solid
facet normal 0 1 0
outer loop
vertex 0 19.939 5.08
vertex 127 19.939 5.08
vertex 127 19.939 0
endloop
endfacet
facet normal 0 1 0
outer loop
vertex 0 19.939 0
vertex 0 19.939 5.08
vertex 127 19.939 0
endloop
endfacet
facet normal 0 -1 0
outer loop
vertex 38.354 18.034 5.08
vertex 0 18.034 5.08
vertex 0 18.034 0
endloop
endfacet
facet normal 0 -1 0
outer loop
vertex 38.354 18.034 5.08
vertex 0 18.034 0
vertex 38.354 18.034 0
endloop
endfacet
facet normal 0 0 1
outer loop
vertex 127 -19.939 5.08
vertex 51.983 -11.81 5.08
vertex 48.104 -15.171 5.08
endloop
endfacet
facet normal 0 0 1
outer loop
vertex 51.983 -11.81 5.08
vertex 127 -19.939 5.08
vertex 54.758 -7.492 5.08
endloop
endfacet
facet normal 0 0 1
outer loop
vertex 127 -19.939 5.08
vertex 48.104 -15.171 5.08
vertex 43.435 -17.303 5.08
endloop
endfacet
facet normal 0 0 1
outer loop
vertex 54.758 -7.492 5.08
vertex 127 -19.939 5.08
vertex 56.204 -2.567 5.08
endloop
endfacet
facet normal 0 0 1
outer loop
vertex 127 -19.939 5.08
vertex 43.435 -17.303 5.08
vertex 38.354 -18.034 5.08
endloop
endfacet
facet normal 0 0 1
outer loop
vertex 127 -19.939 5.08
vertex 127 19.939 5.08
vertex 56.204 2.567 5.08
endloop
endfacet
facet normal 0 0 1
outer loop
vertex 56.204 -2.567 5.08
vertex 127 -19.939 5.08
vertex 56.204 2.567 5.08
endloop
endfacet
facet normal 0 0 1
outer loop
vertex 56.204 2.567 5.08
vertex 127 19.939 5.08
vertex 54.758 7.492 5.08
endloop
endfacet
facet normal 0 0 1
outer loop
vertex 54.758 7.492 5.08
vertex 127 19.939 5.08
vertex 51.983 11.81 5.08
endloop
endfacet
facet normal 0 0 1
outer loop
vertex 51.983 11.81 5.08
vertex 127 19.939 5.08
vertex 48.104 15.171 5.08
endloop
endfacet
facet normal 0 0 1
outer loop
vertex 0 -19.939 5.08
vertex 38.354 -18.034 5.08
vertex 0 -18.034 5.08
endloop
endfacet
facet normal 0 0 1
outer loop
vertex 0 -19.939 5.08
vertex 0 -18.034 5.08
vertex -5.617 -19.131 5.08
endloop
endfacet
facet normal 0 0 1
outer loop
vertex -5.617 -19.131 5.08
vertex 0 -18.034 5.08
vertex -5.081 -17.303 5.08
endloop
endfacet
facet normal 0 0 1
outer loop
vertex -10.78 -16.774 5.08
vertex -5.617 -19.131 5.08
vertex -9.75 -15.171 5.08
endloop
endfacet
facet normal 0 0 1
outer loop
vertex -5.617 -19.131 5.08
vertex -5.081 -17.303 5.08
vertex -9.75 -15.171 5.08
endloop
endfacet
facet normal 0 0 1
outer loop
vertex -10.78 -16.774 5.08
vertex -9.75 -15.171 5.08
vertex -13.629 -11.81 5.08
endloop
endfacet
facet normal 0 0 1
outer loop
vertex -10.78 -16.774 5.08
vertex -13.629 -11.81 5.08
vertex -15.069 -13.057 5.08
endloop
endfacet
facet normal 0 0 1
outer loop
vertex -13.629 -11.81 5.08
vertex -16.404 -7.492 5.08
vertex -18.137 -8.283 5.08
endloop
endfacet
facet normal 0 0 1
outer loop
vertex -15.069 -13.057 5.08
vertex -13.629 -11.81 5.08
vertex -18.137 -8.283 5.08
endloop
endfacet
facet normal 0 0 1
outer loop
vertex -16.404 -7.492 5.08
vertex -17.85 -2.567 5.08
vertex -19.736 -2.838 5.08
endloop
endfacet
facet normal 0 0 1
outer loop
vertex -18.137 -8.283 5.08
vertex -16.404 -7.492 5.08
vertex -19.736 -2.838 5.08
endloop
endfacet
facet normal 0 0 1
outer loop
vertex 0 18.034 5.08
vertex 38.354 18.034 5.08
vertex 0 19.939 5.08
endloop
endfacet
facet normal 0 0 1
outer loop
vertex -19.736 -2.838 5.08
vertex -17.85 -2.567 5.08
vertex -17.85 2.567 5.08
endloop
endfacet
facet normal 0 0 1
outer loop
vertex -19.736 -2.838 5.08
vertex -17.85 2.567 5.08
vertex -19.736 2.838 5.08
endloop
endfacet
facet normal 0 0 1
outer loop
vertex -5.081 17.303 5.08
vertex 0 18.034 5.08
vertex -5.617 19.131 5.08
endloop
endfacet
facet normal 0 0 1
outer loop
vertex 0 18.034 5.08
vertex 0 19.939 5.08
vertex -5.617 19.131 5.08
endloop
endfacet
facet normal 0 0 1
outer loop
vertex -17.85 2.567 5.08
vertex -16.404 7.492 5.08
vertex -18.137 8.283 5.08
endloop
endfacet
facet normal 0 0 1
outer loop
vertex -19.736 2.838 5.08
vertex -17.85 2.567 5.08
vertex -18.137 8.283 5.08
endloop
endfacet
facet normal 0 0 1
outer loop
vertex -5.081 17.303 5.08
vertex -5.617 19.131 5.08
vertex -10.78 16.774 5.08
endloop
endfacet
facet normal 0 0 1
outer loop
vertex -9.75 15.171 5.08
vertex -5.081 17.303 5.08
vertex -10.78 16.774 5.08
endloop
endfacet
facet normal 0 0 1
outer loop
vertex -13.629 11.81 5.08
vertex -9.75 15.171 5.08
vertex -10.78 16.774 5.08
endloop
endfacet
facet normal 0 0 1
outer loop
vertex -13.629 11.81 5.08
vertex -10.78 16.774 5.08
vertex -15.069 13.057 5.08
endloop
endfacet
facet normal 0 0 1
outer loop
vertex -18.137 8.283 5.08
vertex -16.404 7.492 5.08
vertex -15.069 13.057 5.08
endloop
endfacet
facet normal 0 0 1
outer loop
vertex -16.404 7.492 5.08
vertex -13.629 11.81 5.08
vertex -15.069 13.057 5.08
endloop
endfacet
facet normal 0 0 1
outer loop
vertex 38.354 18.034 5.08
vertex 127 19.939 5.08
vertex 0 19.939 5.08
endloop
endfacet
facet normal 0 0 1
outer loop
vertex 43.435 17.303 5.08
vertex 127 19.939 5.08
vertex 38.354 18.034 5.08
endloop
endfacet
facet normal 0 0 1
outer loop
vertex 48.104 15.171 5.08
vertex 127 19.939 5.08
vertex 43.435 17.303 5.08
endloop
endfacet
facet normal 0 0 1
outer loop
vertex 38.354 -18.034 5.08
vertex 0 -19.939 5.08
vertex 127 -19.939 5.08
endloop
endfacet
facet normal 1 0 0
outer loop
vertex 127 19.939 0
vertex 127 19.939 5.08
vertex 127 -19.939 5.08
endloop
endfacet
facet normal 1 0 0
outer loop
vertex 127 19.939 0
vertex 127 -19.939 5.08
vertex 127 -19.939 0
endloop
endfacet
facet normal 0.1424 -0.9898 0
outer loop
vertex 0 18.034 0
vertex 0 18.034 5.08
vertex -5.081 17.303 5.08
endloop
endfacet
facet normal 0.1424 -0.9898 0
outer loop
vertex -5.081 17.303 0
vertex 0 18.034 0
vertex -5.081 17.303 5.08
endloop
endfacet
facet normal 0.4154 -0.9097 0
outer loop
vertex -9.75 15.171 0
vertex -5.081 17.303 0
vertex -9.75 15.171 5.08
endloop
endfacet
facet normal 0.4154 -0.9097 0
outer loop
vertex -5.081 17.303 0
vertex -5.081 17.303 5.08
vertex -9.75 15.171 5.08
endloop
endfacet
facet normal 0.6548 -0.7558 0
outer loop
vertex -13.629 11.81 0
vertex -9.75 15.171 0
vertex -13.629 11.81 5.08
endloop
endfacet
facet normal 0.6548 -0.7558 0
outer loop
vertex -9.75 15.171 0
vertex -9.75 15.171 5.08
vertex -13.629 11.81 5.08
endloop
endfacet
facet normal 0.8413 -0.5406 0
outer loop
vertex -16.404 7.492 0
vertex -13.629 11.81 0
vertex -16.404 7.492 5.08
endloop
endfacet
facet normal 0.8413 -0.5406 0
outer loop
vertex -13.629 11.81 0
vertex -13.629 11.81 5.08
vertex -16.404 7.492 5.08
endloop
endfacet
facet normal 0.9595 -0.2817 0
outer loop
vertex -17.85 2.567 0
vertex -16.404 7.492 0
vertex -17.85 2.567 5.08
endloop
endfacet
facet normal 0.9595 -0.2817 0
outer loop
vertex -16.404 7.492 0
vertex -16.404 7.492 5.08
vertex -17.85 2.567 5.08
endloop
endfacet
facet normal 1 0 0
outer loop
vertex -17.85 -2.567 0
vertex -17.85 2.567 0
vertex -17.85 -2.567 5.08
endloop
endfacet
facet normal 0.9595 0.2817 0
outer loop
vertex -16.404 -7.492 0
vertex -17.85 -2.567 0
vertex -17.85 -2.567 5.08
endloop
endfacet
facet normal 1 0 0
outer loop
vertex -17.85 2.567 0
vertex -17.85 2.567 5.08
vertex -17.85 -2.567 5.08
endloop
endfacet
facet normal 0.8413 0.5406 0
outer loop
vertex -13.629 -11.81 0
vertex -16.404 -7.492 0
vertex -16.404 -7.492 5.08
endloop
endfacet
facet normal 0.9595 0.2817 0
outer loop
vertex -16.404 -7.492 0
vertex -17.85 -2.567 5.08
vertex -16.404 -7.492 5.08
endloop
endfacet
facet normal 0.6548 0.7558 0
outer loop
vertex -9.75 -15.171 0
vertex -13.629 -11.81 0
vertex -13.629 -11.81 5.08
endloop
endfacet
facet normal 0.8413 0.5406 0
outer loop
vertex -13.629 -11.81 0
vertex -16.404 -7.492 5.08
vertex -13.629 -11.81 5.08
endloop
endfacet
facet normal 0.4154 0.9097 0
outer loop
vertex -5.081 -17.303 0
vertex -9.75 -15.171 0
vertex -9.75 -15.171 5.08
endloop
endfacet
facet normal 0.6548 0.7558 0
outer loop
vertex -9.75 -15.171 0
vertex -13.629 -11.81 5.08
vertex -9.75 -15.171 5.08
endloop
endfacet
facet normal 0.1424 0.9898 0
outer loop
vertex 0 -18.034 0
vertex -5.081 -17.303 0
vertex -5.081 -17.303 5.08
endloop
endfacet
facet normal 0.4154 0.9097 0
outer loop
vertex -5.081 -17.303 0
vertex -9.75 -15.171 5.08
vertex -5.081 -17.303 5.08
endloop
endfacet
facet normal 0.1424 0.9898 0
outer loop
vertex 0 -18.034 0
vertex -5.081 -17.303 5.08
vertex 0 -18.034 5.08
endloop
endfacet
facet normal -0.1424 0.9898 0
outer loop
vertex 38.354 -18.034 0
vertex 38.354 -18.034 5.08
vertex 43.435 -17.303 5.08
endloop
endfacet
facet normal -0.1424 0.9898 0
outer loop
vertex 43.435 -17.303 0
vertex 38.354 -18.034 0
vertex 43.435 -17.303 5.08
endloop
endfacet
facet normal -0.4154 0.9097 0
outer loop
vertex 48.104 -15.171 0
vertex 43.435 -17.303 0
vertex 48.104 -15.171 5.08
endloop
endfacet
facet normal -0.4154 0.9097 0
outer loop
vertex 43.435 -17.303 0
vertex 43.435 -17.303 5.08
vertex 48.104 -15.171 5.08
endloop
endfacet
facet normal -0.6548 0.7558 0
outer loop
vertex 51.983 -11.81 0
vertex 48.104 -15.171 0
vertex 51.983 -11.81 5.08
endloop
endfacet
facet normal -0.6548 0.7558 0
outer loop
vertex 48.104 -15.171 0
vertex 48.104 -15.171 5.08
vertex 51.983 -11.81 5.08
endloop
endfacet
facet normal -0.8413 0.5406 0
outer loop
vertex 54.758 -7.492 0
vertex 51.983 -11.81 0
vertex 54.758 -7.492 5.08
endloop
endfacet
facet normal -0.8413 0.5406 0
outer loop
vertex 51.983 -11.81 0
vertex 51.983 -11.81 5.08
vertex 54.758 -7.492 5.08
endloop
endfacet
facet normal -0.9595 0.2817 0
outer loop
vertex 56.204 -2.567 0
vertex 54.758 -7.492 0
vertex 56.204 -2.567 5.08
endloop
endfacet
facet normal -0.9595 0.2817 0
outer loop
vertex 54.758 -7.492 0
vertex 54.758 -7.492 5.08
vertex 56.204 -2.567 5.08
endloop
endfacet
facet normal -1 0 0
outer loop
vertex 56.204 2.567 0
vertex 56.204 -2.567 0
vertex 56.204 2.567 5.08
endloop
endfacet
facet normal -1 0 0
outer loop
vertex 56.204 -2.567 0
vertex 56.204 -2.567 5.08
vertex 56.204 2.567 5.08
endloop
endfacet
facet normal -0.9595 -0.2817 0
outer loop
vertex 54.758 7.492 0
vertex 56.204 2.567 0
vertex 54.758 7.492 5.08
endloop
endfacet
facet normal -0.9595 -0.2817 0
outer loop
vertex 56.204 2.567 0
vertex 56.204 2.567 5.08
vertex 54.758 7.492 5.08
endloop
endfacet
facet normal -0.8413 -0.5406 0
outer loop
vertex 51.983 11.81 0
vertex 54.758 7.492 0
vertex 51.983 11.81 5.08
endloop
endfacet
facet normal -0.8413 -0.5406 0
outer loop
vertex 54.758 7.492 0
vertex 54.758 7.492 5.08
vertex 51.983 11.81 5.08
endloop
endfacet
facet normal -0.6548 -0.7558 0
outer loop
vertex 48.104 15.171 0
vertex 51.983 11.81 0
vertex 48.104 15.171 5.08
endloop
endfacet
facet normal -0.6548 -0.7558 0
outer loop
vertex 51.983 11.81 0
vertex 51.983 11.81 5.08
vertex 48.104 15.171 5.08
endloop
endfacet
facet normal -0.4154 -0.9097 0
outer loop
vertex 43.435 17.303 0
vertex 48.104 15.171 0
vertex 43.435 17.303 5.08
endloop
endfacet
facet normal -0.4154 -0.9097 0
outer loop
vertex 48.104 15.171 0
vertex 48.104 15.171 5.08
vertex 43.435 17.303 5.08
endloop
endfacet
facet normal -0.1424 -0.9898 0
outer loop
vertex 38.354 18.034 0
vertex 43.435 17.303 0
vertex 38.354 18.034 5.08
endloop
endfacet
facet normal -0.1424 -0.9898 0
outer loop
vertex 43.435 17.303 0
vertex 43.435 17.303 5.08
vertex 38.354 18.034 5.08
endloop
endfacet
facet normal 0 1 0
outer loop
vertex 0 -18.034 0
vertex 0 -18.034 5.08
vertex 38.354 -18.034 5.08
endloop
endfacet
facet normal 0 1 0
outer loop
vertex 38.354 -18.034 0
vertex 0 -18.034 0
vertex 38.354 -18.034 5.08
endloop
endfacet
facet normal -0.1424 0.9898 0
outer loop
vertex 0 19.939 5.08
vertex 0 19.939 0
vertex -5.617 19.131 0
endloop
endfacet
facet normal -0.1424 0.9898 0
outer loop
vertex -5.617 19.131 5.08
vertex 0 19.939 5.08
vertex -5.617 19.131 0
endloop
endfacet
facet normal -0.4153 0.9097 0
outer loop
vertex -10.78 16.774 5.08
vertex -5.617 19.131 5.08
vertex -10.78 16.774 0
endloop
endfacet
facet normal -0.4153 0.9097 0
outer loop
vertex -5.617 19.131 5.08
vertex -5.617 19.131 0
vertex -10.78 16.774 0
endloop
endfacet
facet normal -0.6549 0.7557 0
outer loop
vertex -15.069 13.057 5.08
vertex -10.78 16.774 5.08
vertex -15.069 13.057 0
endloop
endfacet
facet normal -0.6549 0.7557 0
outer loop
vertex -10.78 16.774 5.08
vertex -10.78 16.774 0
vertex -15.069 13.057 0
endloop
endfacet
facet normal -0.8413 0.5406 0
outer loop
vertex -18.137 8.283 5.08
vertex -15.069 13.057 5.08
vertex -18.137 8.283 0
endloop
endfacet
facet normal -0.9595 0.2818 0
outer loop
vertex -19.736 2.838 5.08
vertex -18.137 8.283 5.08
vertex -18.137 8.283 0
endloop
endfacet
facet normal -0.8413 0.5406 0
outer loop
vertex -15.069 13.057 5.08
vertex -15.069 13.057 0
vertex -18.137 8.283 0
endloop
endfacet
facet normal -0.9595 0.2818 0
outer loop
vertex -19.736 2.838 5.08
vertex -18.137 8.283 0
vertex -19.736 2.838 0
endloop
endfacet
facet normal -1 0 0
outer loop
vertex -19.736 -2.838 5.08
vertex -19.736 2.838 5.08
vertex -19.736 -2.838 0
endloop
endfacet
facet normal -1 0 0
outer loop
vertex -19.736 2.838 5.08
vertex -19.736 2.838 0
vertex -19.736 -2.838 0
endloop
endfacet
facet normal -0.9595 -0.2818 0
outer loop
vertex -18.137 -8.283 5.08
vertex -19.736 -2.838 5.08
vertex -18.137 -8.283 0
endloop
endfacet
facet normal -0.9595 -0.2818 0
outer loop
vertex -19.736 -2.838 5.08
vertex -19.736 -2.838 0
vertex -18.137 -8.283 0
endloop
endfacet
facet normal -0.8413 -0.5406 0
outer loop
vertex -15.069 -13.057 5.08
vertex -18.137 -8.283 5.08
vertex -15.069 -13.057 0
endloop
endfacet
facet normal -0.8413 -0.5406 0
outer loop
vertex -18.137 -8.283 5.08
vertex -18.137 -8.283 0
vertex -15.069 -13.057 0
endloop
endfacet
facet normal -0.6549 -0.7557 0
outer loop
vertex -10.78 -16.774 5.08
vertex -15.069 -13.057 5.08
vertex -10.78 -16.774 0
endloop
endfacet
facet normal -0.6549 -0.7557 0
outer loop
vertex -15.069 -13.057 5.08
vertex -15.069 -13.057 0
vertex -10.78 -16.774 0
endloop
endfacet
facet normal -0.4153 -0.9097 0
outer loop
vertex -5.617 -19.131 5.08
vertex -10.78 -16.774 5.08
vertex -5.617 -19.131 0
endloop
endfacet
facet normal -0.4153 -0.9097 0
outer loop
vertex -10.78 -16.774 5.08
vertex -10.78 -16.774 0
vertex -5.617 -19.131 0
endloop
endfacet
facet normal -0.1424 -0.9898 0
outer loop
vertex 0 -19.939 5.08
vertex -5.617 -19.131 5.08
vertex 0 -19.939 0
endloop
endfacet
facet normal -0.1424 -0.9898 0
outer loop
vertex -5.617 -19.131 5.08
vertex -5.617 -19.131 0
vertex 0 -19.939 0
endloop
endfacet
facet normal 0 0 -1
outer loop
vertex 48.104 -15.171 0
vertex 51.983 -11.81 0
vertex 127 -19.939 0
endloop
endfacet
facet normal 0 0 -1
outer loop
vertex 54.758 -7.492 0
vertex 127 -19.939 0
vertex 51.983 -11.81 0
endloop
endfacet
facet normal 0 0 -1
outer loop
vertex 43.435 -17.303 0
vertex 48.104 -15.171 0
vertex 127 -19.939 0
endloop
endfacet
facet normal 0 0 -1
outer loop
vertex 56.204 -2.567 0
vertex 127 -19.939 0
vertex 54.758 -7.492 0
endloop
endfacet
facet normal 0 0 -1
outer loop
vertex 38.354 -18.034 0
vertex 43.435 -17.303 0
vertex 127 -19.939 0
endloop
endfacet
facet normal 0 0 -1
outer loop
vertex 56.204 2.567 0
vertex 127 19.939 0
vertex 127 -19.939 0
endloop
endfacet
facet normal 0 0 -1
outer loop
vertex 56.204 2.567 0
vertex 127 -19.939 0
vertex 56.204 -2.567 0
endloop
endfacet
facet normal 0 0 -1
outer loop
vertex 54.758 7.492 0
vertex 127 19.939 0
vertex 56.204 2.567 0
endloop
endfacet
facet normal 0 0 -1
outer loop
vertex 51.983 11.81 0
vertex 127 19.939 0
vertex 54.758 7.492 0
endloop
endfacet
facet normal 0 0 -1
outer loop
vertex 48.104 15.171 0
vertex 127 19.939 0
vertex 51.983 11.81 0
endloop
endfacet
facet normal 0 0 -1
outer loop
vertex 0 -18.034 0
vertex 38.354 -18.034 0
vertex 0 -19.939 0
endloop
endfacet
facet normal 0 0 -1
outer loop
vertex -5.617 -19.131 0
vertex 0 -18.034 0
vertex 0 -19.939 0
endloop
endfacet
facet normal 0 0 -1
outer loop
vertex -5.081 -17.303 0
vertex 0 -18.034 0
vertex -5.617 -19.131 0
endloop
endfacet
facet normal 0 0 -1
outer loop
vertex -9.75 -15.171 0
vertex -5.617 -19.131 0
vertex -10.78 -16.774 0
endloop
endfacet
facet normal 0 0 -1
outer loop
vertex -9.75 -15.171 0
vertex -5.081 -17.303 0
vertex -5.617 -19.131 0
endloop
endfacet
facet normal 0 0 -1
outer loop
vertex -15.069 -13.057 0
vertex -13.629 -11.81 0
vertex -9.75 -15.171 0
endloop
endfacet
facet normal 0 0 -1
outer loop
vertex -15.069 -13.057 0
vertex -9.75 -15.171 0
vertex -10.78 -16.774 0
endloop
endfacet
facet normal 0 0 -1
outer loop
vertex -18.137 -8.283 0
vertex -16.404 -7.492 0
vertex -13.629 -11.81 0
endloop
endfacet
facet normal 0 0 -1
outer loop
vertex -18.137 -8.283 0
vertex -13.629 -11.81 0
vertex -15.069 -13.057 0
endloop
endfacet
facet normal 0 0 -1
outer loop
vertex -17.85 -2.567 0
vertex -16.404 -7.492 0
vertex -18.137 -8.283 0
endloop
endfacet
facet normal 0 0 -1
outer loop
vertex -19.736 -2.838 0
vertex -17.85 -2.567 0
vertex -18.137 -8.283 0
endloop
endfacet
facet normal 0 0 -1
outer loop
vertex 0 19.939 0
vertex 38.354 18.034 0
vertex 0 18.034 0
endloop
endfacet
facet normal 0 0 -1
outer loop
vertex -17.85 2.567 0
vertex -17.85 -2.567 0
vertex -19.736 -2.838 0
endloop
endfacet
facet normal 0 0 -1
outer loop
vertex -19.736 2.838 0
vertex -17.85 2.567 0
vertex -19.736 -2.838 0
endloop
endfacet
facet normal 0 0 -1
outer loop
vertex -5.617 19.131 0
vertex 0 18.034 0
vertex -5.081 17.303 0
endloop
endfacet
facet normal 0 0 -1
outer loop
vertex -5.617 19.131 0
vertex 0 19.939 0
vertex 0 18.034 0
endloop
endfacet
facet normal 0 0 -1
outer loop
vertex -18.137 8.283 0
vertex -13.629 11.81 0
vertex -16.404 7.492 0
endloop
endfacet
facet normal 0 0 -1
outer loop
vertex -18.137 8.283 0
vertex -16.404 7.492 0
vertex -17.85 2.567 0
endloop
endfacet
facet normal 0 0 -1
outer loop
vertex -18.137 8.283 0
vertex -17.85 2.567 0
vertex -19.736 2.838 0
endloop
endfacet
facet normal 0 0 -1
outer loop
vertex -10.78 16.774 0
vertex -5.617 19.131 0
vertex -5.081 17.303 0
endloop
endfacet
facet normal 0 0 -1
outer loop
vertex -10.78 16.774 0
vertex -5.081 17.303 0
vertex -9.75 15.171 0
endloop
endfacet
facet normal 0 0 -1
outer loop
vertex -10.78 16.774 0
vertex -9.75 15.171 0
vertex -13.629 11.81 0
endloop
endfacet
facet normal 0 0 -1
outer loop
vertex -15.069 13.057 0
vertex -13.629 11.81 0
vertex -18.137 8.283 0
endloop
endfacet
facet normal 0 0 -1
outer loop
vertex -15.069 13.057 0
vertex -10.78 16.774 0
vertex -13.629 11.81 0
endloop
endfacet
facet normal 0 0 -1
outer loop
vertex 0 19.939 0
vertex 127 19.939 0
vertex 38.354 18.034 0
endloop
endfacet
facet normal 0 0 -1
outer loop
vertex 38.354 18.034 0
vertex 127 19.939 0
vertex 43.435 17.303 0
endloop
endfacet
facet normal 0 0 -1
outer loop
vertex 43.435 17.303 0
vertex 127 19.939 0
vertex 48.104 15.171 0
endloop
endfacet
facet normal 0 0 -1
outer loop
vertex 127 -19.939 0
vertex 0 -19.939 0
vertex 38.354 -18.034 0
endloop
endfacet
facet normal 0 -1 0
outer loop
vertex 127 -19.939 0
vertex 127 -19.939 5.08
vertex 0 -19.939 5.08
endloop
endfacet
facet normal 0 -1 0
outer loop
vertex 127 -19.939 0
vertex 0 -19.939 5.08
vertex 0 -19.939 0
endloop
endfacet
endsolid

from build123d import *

# Parameters (mm, degrees)
SKETCH1_R               = 19.939
CIRCLE_EXTRUDE_DEPTH    = 5.08
SKETCH3_W               = 5.08
SKETCH3_H               = 39.878
RECTANGLE_EXTRUDE_DEPTH = 127
SKETCH2_R               = 18.034
CIRCLE_CUT_DEPTH        = 129.65601471
SKETCH6_W               = 125.095
SKETCH6_H               = 36.068
RECTANGLE_CUT_DEPTH     = 129.65601471
END_SHAPE_DEPTH         = 5.08


with BuildPart() as part:
    # Sketch1 → circle extrude (new body)
    with BuildSketch(Plane.XY):
        Circle(SKETCH1_R)
    extrude(amount=CIRCLE_EXTRUDE_DEPTH)

    # Sketch3 → rectangle extrude (add)
    with BuildSketch(Plane(origin=(0, 0, 0), x_dir=(0, 0, -1), z_dir=(1, 0, 0))):
        with Locations((-2.54, 0)):
            Rectangle(SKETCH3_W, SKETCH3_H)
    extrude(amount=RECTANGLE_EXTRUDE_DEPTH)

    # Sketch2 → circle cut (cut, through all)
    with BuildSketch(Plane.XY.offset(5.08)):
        Circle(SKETCH2_R)
    extrude(amount=-CIRCLE_CUT_DEPTH, mode=Mode.SUBTRACT)

    # Sketch6 → rectangle cut (cut, through all)
    with BuildSketch(Plane.XY.offset(5.08)):
        with Locations((62.5475, 0)):
            Rectangle(SKETCH6_W, SKETCH6_H)
    extrude(amount=-RECTANGLE_CUT_DEPTH, mode=Mode.SUBTRACT)

    # Sketch7 → end shape (add)
    with BuildSketch(Plane.XY.offset(5.08)):
        with BuildLine():
            Line((38.354, 18.034), (125.095, 18.034))
            Line((125.095, 18.034), (125.095, -18.034))
            Line((125.095, -18.034), (38.354, -18.034))
            ThreePointArc((38.354, -18.034), (56.388, 0), (38.354, 18.034))
        make_face()
    extrude(amount=-END_SHAPE_DEPTH)


solid = part.part
